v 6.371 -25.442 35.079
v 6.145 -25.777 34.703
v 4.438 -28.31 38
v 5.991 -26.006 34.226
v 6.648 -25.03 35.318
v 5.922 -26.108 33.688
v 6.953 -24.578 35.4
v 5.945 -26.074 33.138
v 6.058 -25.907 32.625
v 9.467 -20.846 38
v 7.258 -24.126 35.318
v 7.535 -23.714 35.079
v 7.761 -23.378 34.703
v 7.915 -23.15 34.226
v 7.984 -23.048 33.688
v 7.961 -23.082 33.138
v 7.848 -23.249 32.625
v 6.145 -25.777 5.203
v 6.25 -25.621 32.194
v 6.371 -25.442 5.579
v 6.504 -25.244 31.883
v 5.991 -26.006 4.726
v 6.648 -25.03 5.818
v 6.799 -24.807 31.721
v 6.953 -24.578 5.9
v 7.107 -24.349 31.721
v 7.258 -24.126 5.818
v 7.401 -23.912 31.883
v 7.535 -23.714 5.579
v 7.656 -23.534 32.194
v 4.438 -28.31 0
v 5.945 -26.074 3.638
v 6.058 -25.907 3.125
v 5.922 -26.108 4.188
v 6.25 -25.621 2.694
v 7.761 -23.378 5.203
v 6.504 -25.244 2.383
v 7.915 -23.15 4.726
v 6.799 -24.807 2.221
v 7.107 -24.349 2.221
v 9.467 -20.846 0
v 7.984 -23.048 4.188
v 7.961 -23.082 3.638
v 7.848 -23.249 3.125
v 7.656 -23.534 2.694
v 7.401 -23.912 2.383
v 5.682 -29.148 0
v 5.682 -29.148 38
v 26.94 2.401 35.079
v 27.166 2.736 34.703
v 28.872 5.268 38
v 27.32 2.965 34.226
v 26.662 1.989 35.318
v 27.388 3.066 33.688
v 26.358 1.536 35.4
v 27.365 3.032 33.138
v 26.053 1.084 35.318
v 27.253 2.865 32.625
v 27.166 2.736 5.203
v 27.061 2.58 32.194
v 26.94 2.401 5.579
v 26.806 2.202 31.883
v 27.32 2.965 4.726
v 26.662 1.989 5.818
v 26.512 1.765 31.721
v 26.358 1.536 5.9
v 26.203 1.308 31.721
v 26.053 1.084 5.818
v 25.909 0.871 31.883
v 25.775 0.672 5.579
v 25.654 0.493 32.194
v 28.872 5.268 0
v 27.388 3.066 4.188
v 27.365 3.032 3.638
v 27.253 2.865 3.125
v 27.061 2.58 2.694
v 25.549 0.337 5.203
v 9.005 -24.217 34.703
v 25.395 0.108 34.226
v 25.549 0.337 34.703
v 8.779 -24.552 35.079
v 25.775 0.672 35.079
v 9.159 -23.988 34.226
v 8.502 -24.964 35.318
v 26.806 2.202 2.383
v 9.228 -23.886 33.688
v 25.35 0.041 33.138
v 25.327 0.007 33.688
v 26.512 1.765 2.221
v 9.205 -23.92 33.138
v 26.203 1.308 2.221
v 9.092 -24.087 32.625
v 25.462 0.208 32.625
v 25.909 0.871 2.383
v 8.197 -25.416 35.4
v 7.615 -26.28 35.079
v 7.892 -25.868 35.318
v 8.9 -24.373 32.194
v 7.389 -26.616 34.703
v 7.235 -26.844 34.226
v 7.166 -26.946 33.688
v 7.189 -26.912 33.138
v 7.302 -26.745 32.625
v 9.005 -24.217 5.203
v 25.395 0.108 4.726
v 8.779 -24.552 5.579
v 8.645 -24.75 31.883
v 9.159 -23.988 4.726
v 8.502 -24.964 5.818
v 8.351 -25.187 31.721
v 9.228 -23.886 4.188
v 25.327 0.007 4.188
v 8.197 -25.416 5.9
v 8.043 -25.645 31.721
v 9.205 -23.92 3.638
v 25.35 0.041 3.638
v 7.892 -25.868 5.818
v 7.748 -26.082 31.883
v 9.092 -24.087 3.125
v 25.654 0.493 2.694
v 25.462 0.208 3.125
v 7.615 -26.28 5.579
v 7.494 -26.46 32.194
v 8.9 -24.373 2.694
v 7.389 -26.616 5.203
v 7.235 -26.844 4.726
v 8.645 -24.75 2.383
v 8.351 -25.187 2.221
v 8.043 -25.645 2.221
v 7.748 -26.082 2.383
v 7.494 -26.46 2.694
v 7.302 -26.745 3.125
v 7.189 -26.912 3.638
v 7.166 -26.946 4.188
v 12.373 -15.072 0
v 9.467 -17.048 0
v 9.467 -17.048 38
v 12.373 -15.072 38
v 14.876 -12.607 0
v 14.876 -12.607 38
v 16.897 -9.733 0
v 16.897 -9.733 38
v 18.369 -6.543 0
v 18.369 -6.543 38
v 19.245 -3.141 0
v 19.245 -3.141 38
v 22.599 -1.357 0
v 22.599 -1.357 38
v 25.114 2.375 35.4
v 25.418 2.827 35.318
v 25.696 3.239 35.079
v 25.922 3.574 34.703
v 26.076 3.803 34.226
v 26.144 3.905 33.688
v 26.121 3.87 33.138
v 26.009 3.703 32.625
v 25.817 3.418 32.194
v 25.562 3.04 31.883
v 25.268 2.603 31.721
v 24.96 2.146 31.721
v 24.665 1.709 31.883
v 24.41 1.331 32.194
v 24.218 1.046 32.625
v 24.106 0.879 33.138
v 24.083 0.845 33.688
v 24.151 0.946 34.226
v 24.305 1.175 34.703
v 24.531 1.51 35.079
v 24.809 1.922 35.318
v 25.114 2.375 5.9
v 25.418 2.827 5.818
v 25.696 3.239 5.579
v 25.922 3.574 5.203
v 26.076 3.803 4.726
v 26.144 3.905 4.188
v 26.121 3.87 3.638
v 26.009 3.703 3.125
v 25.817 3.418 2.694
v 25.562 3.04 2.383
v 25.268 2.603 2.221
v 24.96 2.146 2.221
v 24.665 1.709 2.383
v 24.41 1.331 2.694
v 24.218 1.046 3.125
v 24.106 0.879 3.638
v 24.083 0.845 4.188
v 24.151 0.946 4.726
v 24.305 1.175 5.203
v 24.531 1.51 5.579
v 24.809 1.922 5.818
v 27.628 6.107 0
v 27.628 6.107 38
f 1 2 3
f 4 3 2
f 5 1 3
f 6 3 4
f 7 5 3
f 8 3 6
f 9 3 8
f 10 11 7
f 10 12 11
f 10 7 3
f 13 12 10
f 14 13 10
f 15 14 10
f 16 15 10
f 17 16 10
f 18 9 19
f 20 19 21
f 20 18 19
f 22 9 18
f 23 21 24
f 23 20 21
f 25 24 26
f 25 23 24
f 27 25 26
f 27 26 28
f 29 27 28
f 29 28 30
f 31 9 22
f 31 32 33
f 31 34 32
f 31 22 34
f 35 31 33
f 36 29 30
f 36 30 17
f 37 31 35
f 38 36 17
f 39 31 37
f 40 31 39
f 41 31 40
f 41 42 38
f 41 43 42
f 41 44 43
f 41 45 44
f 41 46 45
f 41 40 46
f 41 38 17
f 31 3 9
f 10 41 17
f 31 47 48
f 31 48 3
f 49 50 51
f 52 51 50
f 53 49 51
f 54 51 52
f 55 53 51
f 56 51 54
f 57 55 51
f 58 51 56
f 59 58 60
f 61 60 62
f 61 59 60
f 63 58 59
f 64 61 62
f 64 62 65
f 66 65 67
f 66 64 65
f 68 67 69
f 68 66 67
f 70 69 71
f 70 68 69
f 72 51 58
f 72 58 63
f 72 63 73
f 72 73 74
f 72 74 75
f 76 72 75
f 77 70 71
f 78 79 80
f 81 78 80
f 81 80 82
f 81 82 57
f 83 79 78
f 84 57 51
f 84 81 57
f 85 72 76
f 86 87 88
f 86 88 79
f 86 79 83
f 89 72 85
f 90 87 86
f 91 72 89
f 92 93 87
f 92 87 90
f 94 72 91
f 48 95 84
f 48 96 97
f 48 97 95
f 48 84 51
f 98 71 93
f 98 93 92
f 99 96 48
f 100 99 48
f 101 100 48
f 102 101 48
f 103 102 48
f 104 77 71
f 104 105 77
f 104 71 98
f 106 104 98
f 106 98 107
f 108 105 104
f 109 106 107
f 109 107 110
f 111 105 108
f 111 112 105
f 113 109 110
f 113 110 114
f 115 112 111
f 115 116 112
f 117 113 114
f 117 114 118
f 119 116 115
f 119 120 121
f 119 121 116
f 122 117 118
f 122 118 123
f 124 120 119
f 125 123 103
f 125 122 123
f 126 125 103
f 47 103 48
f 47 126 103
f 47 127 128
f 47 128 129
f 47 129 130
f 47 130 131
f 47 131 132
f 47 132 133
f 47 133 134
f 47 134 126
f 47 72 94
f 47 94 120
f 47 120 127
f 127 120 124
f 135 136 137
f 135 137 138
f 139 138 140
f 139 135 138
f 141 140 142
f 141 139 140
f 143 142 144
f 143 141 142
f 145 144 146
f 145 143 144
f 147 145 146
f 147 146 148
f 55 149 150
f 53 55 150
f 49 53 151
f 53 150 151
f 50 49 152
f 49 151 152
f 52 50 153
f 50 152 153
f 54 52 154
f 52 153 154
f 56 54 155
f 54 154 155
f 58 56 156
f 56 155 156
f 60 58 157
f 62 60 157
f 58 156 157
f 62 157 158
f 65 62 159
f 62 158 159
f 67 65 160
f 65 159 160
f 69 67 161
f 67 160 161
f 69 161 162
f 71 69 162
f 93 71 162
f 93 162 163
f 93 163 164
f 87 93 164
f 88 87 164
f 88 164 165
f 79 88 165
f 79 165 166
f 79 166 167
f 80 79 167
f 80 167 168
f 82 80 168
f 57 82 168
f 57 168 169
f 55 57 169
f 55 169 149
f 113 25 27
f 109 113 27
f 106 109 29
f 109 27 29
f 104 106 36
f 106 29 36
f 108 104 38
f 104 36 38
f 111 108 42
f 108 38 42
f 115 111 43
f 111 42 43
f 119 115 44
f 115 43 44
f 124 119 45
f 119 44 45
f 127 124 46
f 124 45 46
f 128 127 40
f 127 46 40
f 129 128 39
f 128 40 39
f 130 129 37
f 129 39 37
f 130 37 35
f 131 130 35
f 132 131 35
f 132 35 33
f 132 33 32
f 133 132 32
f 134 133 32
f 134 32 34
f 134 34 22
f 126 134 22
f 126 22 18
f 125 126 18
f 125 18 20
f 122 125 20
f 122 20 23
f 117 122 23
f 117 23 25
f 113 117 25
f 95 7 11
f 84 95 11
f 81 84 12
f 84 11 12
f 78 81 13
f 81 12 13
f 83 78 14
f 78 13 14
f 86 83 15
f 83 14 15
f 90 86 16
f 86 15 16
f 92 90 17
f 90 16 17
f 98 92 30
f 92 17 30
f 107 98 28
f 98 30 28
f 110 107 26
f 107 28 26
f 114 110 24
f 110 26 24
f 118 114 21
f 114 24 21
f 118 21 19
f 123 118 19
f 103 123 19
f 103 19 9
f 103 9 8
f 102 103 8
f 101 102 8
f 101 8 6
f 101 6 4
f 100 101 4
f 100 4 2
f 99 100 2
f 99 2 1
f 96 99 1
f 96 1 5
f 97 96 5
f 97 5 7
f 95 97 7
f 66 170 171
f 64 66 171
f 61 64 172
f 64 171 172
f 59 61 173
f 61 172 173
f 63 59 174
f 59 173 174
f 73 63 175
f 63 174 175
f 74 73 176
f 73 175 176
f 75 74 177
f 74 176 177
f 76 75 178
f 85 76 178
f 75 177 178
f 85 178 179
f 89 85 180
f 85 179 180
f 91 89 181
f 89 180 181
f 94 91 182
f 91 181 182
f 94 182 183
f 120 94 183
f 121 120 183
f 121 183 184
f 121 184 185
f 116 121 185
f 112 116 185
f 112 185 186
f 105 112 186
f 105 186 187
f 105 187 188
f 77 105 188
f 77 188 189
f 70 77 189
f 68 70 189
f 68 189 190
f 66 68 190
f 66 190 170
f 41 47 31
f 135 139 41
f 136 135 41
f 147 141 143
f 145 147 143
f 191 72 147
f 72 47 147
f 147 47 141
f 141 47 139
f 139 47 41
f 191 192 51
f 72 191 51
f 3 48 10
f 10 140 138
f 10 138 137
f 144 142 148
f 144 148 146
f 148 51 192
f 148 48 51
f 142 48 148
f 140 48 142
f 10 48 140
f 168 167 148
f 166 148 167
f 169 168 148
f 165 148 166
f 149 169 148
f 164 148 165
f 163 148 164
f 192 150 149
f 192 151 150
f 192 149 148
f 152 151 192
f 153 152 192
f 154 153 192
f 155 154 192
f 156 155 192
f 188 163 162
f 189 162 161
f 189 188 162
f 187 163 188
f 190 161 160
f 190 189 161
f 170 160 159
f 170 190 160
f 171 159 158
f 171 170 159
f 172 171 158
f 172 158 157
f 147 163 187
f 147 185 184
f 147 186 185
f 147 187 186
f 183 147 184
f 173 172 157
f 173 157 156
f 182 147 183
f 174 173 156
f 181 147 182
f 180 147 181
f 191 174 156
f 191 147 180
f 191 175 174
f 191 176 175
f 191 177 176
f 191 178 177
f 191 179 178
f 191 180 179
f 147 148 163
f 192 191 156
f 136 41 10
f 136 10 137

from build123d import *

# Parameters (mm, degrees)
BOSS_EXTRUDE1_DEPTH = 38
SKETCH2_R           = 1.85
CUT_EXTRUDE1_DEPTH  = 21.73151986


with BuildPart() as part:
    # Sketch1 → Boss-Extrude1 (new body)
    with BuildSketch(Plane.XY):
        with BuildLine():
            Line((19.245374747, -3.140947442), (22.599041108, -1.357255436))
            Line((22.599041108, -1.357255436), (27.628159729, 6.106521483))
            Line((27.628159729, 6.106521483), (28.872122548, 5.268335046))
            Line((28.872122548, 5.268335046), (5.682297797, -29.147969636))
            Line((5.682297797, -29.147969636), (4.438334977, -28.309783199))
            Line((4.438334977, -28.309783199), (9.467453598, -20.84600628))
            Line((9.467453598, -20.84600628), (9.467453598, -17.047501939))
            ThreePointArc((9.467453598, -17.047501939), (15.951636041, -11.21585073), (19.245374747, -3.140947442))
        make_face()
    extrude(amount=BOSS_EXTRUDE1_DEPTH)

    # Sketch2 → Cut-Extrude1 (cut, through all)
    with BuildSketch(Plane(origin=(16.171516658, -10.896423679, 0), x_dir=(0, 0, 1), z_dir=(-0.829308547, 0.558790958, 0))):
        with Locations((4.05, 16.002556295)):
            Circle(SKETCH2_R)
        with Locations((33.55, 16.002556295)):
            Circle(SKETCH2_R)
        with Locations((4.05, -16.497443705)):
            Circle(SKETCH2_R)
        with Locations((33.55, -16.497443705)):
            Circle(SKETCH2_R)
    extrude(amount=-CUT_EXTRUDE1_DEPTH, mode=Mode.SUBTRACT)


solid = part.part
